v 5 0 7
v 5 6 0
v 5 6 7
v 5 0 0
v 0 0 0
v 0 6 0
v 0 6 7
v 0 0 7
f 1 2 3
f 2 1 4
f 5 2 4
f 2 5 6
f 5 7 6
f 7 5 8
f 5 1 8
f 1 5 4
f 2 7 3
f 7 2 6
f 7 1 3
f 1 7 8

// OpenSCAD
translate([2.5, 1.5, 1.0]) color([0.4976795968420046, 0.9609180855182016, 0.5437408220916614]) cube([5, 3, 2], center=true);
translate([2.5, 4.5, 1.0]) color([0.405305104554358, 0.6320656015278037, 0.0216193804206819]) cube([5, 3, 2], center=true);
translate([2.5, 1.5, 3.0]) color([0.2700784048715086, 0.6684886667173141, 0.0002532098932251925]) cube([5, 3, 2], center=true);
translate([2.5, 4.5, 3.0]) color([0.3984286079265319, 0.8905618085087551, 0.7099647178965433]) cube([5, 3, 2], center=true);
translate([2.5, 1.0, 5.5]) color([0.4445845492335537, 0.7465509493098265, 0.35382203223851694]) cube([5, 2, 3], center=true);
translate([2.5, 3.0, 5.5]) color([0.8712980207444939, 0.6725473918674463, 0.19603088941730495]) cube([5, 2, 3], center=true);
translate([2.5, 5.0, 5.5]) color([0.08525923665948931, 0.0704556688087915, 0.26248678792717994]) cube([5, 2, 3], center=true);
